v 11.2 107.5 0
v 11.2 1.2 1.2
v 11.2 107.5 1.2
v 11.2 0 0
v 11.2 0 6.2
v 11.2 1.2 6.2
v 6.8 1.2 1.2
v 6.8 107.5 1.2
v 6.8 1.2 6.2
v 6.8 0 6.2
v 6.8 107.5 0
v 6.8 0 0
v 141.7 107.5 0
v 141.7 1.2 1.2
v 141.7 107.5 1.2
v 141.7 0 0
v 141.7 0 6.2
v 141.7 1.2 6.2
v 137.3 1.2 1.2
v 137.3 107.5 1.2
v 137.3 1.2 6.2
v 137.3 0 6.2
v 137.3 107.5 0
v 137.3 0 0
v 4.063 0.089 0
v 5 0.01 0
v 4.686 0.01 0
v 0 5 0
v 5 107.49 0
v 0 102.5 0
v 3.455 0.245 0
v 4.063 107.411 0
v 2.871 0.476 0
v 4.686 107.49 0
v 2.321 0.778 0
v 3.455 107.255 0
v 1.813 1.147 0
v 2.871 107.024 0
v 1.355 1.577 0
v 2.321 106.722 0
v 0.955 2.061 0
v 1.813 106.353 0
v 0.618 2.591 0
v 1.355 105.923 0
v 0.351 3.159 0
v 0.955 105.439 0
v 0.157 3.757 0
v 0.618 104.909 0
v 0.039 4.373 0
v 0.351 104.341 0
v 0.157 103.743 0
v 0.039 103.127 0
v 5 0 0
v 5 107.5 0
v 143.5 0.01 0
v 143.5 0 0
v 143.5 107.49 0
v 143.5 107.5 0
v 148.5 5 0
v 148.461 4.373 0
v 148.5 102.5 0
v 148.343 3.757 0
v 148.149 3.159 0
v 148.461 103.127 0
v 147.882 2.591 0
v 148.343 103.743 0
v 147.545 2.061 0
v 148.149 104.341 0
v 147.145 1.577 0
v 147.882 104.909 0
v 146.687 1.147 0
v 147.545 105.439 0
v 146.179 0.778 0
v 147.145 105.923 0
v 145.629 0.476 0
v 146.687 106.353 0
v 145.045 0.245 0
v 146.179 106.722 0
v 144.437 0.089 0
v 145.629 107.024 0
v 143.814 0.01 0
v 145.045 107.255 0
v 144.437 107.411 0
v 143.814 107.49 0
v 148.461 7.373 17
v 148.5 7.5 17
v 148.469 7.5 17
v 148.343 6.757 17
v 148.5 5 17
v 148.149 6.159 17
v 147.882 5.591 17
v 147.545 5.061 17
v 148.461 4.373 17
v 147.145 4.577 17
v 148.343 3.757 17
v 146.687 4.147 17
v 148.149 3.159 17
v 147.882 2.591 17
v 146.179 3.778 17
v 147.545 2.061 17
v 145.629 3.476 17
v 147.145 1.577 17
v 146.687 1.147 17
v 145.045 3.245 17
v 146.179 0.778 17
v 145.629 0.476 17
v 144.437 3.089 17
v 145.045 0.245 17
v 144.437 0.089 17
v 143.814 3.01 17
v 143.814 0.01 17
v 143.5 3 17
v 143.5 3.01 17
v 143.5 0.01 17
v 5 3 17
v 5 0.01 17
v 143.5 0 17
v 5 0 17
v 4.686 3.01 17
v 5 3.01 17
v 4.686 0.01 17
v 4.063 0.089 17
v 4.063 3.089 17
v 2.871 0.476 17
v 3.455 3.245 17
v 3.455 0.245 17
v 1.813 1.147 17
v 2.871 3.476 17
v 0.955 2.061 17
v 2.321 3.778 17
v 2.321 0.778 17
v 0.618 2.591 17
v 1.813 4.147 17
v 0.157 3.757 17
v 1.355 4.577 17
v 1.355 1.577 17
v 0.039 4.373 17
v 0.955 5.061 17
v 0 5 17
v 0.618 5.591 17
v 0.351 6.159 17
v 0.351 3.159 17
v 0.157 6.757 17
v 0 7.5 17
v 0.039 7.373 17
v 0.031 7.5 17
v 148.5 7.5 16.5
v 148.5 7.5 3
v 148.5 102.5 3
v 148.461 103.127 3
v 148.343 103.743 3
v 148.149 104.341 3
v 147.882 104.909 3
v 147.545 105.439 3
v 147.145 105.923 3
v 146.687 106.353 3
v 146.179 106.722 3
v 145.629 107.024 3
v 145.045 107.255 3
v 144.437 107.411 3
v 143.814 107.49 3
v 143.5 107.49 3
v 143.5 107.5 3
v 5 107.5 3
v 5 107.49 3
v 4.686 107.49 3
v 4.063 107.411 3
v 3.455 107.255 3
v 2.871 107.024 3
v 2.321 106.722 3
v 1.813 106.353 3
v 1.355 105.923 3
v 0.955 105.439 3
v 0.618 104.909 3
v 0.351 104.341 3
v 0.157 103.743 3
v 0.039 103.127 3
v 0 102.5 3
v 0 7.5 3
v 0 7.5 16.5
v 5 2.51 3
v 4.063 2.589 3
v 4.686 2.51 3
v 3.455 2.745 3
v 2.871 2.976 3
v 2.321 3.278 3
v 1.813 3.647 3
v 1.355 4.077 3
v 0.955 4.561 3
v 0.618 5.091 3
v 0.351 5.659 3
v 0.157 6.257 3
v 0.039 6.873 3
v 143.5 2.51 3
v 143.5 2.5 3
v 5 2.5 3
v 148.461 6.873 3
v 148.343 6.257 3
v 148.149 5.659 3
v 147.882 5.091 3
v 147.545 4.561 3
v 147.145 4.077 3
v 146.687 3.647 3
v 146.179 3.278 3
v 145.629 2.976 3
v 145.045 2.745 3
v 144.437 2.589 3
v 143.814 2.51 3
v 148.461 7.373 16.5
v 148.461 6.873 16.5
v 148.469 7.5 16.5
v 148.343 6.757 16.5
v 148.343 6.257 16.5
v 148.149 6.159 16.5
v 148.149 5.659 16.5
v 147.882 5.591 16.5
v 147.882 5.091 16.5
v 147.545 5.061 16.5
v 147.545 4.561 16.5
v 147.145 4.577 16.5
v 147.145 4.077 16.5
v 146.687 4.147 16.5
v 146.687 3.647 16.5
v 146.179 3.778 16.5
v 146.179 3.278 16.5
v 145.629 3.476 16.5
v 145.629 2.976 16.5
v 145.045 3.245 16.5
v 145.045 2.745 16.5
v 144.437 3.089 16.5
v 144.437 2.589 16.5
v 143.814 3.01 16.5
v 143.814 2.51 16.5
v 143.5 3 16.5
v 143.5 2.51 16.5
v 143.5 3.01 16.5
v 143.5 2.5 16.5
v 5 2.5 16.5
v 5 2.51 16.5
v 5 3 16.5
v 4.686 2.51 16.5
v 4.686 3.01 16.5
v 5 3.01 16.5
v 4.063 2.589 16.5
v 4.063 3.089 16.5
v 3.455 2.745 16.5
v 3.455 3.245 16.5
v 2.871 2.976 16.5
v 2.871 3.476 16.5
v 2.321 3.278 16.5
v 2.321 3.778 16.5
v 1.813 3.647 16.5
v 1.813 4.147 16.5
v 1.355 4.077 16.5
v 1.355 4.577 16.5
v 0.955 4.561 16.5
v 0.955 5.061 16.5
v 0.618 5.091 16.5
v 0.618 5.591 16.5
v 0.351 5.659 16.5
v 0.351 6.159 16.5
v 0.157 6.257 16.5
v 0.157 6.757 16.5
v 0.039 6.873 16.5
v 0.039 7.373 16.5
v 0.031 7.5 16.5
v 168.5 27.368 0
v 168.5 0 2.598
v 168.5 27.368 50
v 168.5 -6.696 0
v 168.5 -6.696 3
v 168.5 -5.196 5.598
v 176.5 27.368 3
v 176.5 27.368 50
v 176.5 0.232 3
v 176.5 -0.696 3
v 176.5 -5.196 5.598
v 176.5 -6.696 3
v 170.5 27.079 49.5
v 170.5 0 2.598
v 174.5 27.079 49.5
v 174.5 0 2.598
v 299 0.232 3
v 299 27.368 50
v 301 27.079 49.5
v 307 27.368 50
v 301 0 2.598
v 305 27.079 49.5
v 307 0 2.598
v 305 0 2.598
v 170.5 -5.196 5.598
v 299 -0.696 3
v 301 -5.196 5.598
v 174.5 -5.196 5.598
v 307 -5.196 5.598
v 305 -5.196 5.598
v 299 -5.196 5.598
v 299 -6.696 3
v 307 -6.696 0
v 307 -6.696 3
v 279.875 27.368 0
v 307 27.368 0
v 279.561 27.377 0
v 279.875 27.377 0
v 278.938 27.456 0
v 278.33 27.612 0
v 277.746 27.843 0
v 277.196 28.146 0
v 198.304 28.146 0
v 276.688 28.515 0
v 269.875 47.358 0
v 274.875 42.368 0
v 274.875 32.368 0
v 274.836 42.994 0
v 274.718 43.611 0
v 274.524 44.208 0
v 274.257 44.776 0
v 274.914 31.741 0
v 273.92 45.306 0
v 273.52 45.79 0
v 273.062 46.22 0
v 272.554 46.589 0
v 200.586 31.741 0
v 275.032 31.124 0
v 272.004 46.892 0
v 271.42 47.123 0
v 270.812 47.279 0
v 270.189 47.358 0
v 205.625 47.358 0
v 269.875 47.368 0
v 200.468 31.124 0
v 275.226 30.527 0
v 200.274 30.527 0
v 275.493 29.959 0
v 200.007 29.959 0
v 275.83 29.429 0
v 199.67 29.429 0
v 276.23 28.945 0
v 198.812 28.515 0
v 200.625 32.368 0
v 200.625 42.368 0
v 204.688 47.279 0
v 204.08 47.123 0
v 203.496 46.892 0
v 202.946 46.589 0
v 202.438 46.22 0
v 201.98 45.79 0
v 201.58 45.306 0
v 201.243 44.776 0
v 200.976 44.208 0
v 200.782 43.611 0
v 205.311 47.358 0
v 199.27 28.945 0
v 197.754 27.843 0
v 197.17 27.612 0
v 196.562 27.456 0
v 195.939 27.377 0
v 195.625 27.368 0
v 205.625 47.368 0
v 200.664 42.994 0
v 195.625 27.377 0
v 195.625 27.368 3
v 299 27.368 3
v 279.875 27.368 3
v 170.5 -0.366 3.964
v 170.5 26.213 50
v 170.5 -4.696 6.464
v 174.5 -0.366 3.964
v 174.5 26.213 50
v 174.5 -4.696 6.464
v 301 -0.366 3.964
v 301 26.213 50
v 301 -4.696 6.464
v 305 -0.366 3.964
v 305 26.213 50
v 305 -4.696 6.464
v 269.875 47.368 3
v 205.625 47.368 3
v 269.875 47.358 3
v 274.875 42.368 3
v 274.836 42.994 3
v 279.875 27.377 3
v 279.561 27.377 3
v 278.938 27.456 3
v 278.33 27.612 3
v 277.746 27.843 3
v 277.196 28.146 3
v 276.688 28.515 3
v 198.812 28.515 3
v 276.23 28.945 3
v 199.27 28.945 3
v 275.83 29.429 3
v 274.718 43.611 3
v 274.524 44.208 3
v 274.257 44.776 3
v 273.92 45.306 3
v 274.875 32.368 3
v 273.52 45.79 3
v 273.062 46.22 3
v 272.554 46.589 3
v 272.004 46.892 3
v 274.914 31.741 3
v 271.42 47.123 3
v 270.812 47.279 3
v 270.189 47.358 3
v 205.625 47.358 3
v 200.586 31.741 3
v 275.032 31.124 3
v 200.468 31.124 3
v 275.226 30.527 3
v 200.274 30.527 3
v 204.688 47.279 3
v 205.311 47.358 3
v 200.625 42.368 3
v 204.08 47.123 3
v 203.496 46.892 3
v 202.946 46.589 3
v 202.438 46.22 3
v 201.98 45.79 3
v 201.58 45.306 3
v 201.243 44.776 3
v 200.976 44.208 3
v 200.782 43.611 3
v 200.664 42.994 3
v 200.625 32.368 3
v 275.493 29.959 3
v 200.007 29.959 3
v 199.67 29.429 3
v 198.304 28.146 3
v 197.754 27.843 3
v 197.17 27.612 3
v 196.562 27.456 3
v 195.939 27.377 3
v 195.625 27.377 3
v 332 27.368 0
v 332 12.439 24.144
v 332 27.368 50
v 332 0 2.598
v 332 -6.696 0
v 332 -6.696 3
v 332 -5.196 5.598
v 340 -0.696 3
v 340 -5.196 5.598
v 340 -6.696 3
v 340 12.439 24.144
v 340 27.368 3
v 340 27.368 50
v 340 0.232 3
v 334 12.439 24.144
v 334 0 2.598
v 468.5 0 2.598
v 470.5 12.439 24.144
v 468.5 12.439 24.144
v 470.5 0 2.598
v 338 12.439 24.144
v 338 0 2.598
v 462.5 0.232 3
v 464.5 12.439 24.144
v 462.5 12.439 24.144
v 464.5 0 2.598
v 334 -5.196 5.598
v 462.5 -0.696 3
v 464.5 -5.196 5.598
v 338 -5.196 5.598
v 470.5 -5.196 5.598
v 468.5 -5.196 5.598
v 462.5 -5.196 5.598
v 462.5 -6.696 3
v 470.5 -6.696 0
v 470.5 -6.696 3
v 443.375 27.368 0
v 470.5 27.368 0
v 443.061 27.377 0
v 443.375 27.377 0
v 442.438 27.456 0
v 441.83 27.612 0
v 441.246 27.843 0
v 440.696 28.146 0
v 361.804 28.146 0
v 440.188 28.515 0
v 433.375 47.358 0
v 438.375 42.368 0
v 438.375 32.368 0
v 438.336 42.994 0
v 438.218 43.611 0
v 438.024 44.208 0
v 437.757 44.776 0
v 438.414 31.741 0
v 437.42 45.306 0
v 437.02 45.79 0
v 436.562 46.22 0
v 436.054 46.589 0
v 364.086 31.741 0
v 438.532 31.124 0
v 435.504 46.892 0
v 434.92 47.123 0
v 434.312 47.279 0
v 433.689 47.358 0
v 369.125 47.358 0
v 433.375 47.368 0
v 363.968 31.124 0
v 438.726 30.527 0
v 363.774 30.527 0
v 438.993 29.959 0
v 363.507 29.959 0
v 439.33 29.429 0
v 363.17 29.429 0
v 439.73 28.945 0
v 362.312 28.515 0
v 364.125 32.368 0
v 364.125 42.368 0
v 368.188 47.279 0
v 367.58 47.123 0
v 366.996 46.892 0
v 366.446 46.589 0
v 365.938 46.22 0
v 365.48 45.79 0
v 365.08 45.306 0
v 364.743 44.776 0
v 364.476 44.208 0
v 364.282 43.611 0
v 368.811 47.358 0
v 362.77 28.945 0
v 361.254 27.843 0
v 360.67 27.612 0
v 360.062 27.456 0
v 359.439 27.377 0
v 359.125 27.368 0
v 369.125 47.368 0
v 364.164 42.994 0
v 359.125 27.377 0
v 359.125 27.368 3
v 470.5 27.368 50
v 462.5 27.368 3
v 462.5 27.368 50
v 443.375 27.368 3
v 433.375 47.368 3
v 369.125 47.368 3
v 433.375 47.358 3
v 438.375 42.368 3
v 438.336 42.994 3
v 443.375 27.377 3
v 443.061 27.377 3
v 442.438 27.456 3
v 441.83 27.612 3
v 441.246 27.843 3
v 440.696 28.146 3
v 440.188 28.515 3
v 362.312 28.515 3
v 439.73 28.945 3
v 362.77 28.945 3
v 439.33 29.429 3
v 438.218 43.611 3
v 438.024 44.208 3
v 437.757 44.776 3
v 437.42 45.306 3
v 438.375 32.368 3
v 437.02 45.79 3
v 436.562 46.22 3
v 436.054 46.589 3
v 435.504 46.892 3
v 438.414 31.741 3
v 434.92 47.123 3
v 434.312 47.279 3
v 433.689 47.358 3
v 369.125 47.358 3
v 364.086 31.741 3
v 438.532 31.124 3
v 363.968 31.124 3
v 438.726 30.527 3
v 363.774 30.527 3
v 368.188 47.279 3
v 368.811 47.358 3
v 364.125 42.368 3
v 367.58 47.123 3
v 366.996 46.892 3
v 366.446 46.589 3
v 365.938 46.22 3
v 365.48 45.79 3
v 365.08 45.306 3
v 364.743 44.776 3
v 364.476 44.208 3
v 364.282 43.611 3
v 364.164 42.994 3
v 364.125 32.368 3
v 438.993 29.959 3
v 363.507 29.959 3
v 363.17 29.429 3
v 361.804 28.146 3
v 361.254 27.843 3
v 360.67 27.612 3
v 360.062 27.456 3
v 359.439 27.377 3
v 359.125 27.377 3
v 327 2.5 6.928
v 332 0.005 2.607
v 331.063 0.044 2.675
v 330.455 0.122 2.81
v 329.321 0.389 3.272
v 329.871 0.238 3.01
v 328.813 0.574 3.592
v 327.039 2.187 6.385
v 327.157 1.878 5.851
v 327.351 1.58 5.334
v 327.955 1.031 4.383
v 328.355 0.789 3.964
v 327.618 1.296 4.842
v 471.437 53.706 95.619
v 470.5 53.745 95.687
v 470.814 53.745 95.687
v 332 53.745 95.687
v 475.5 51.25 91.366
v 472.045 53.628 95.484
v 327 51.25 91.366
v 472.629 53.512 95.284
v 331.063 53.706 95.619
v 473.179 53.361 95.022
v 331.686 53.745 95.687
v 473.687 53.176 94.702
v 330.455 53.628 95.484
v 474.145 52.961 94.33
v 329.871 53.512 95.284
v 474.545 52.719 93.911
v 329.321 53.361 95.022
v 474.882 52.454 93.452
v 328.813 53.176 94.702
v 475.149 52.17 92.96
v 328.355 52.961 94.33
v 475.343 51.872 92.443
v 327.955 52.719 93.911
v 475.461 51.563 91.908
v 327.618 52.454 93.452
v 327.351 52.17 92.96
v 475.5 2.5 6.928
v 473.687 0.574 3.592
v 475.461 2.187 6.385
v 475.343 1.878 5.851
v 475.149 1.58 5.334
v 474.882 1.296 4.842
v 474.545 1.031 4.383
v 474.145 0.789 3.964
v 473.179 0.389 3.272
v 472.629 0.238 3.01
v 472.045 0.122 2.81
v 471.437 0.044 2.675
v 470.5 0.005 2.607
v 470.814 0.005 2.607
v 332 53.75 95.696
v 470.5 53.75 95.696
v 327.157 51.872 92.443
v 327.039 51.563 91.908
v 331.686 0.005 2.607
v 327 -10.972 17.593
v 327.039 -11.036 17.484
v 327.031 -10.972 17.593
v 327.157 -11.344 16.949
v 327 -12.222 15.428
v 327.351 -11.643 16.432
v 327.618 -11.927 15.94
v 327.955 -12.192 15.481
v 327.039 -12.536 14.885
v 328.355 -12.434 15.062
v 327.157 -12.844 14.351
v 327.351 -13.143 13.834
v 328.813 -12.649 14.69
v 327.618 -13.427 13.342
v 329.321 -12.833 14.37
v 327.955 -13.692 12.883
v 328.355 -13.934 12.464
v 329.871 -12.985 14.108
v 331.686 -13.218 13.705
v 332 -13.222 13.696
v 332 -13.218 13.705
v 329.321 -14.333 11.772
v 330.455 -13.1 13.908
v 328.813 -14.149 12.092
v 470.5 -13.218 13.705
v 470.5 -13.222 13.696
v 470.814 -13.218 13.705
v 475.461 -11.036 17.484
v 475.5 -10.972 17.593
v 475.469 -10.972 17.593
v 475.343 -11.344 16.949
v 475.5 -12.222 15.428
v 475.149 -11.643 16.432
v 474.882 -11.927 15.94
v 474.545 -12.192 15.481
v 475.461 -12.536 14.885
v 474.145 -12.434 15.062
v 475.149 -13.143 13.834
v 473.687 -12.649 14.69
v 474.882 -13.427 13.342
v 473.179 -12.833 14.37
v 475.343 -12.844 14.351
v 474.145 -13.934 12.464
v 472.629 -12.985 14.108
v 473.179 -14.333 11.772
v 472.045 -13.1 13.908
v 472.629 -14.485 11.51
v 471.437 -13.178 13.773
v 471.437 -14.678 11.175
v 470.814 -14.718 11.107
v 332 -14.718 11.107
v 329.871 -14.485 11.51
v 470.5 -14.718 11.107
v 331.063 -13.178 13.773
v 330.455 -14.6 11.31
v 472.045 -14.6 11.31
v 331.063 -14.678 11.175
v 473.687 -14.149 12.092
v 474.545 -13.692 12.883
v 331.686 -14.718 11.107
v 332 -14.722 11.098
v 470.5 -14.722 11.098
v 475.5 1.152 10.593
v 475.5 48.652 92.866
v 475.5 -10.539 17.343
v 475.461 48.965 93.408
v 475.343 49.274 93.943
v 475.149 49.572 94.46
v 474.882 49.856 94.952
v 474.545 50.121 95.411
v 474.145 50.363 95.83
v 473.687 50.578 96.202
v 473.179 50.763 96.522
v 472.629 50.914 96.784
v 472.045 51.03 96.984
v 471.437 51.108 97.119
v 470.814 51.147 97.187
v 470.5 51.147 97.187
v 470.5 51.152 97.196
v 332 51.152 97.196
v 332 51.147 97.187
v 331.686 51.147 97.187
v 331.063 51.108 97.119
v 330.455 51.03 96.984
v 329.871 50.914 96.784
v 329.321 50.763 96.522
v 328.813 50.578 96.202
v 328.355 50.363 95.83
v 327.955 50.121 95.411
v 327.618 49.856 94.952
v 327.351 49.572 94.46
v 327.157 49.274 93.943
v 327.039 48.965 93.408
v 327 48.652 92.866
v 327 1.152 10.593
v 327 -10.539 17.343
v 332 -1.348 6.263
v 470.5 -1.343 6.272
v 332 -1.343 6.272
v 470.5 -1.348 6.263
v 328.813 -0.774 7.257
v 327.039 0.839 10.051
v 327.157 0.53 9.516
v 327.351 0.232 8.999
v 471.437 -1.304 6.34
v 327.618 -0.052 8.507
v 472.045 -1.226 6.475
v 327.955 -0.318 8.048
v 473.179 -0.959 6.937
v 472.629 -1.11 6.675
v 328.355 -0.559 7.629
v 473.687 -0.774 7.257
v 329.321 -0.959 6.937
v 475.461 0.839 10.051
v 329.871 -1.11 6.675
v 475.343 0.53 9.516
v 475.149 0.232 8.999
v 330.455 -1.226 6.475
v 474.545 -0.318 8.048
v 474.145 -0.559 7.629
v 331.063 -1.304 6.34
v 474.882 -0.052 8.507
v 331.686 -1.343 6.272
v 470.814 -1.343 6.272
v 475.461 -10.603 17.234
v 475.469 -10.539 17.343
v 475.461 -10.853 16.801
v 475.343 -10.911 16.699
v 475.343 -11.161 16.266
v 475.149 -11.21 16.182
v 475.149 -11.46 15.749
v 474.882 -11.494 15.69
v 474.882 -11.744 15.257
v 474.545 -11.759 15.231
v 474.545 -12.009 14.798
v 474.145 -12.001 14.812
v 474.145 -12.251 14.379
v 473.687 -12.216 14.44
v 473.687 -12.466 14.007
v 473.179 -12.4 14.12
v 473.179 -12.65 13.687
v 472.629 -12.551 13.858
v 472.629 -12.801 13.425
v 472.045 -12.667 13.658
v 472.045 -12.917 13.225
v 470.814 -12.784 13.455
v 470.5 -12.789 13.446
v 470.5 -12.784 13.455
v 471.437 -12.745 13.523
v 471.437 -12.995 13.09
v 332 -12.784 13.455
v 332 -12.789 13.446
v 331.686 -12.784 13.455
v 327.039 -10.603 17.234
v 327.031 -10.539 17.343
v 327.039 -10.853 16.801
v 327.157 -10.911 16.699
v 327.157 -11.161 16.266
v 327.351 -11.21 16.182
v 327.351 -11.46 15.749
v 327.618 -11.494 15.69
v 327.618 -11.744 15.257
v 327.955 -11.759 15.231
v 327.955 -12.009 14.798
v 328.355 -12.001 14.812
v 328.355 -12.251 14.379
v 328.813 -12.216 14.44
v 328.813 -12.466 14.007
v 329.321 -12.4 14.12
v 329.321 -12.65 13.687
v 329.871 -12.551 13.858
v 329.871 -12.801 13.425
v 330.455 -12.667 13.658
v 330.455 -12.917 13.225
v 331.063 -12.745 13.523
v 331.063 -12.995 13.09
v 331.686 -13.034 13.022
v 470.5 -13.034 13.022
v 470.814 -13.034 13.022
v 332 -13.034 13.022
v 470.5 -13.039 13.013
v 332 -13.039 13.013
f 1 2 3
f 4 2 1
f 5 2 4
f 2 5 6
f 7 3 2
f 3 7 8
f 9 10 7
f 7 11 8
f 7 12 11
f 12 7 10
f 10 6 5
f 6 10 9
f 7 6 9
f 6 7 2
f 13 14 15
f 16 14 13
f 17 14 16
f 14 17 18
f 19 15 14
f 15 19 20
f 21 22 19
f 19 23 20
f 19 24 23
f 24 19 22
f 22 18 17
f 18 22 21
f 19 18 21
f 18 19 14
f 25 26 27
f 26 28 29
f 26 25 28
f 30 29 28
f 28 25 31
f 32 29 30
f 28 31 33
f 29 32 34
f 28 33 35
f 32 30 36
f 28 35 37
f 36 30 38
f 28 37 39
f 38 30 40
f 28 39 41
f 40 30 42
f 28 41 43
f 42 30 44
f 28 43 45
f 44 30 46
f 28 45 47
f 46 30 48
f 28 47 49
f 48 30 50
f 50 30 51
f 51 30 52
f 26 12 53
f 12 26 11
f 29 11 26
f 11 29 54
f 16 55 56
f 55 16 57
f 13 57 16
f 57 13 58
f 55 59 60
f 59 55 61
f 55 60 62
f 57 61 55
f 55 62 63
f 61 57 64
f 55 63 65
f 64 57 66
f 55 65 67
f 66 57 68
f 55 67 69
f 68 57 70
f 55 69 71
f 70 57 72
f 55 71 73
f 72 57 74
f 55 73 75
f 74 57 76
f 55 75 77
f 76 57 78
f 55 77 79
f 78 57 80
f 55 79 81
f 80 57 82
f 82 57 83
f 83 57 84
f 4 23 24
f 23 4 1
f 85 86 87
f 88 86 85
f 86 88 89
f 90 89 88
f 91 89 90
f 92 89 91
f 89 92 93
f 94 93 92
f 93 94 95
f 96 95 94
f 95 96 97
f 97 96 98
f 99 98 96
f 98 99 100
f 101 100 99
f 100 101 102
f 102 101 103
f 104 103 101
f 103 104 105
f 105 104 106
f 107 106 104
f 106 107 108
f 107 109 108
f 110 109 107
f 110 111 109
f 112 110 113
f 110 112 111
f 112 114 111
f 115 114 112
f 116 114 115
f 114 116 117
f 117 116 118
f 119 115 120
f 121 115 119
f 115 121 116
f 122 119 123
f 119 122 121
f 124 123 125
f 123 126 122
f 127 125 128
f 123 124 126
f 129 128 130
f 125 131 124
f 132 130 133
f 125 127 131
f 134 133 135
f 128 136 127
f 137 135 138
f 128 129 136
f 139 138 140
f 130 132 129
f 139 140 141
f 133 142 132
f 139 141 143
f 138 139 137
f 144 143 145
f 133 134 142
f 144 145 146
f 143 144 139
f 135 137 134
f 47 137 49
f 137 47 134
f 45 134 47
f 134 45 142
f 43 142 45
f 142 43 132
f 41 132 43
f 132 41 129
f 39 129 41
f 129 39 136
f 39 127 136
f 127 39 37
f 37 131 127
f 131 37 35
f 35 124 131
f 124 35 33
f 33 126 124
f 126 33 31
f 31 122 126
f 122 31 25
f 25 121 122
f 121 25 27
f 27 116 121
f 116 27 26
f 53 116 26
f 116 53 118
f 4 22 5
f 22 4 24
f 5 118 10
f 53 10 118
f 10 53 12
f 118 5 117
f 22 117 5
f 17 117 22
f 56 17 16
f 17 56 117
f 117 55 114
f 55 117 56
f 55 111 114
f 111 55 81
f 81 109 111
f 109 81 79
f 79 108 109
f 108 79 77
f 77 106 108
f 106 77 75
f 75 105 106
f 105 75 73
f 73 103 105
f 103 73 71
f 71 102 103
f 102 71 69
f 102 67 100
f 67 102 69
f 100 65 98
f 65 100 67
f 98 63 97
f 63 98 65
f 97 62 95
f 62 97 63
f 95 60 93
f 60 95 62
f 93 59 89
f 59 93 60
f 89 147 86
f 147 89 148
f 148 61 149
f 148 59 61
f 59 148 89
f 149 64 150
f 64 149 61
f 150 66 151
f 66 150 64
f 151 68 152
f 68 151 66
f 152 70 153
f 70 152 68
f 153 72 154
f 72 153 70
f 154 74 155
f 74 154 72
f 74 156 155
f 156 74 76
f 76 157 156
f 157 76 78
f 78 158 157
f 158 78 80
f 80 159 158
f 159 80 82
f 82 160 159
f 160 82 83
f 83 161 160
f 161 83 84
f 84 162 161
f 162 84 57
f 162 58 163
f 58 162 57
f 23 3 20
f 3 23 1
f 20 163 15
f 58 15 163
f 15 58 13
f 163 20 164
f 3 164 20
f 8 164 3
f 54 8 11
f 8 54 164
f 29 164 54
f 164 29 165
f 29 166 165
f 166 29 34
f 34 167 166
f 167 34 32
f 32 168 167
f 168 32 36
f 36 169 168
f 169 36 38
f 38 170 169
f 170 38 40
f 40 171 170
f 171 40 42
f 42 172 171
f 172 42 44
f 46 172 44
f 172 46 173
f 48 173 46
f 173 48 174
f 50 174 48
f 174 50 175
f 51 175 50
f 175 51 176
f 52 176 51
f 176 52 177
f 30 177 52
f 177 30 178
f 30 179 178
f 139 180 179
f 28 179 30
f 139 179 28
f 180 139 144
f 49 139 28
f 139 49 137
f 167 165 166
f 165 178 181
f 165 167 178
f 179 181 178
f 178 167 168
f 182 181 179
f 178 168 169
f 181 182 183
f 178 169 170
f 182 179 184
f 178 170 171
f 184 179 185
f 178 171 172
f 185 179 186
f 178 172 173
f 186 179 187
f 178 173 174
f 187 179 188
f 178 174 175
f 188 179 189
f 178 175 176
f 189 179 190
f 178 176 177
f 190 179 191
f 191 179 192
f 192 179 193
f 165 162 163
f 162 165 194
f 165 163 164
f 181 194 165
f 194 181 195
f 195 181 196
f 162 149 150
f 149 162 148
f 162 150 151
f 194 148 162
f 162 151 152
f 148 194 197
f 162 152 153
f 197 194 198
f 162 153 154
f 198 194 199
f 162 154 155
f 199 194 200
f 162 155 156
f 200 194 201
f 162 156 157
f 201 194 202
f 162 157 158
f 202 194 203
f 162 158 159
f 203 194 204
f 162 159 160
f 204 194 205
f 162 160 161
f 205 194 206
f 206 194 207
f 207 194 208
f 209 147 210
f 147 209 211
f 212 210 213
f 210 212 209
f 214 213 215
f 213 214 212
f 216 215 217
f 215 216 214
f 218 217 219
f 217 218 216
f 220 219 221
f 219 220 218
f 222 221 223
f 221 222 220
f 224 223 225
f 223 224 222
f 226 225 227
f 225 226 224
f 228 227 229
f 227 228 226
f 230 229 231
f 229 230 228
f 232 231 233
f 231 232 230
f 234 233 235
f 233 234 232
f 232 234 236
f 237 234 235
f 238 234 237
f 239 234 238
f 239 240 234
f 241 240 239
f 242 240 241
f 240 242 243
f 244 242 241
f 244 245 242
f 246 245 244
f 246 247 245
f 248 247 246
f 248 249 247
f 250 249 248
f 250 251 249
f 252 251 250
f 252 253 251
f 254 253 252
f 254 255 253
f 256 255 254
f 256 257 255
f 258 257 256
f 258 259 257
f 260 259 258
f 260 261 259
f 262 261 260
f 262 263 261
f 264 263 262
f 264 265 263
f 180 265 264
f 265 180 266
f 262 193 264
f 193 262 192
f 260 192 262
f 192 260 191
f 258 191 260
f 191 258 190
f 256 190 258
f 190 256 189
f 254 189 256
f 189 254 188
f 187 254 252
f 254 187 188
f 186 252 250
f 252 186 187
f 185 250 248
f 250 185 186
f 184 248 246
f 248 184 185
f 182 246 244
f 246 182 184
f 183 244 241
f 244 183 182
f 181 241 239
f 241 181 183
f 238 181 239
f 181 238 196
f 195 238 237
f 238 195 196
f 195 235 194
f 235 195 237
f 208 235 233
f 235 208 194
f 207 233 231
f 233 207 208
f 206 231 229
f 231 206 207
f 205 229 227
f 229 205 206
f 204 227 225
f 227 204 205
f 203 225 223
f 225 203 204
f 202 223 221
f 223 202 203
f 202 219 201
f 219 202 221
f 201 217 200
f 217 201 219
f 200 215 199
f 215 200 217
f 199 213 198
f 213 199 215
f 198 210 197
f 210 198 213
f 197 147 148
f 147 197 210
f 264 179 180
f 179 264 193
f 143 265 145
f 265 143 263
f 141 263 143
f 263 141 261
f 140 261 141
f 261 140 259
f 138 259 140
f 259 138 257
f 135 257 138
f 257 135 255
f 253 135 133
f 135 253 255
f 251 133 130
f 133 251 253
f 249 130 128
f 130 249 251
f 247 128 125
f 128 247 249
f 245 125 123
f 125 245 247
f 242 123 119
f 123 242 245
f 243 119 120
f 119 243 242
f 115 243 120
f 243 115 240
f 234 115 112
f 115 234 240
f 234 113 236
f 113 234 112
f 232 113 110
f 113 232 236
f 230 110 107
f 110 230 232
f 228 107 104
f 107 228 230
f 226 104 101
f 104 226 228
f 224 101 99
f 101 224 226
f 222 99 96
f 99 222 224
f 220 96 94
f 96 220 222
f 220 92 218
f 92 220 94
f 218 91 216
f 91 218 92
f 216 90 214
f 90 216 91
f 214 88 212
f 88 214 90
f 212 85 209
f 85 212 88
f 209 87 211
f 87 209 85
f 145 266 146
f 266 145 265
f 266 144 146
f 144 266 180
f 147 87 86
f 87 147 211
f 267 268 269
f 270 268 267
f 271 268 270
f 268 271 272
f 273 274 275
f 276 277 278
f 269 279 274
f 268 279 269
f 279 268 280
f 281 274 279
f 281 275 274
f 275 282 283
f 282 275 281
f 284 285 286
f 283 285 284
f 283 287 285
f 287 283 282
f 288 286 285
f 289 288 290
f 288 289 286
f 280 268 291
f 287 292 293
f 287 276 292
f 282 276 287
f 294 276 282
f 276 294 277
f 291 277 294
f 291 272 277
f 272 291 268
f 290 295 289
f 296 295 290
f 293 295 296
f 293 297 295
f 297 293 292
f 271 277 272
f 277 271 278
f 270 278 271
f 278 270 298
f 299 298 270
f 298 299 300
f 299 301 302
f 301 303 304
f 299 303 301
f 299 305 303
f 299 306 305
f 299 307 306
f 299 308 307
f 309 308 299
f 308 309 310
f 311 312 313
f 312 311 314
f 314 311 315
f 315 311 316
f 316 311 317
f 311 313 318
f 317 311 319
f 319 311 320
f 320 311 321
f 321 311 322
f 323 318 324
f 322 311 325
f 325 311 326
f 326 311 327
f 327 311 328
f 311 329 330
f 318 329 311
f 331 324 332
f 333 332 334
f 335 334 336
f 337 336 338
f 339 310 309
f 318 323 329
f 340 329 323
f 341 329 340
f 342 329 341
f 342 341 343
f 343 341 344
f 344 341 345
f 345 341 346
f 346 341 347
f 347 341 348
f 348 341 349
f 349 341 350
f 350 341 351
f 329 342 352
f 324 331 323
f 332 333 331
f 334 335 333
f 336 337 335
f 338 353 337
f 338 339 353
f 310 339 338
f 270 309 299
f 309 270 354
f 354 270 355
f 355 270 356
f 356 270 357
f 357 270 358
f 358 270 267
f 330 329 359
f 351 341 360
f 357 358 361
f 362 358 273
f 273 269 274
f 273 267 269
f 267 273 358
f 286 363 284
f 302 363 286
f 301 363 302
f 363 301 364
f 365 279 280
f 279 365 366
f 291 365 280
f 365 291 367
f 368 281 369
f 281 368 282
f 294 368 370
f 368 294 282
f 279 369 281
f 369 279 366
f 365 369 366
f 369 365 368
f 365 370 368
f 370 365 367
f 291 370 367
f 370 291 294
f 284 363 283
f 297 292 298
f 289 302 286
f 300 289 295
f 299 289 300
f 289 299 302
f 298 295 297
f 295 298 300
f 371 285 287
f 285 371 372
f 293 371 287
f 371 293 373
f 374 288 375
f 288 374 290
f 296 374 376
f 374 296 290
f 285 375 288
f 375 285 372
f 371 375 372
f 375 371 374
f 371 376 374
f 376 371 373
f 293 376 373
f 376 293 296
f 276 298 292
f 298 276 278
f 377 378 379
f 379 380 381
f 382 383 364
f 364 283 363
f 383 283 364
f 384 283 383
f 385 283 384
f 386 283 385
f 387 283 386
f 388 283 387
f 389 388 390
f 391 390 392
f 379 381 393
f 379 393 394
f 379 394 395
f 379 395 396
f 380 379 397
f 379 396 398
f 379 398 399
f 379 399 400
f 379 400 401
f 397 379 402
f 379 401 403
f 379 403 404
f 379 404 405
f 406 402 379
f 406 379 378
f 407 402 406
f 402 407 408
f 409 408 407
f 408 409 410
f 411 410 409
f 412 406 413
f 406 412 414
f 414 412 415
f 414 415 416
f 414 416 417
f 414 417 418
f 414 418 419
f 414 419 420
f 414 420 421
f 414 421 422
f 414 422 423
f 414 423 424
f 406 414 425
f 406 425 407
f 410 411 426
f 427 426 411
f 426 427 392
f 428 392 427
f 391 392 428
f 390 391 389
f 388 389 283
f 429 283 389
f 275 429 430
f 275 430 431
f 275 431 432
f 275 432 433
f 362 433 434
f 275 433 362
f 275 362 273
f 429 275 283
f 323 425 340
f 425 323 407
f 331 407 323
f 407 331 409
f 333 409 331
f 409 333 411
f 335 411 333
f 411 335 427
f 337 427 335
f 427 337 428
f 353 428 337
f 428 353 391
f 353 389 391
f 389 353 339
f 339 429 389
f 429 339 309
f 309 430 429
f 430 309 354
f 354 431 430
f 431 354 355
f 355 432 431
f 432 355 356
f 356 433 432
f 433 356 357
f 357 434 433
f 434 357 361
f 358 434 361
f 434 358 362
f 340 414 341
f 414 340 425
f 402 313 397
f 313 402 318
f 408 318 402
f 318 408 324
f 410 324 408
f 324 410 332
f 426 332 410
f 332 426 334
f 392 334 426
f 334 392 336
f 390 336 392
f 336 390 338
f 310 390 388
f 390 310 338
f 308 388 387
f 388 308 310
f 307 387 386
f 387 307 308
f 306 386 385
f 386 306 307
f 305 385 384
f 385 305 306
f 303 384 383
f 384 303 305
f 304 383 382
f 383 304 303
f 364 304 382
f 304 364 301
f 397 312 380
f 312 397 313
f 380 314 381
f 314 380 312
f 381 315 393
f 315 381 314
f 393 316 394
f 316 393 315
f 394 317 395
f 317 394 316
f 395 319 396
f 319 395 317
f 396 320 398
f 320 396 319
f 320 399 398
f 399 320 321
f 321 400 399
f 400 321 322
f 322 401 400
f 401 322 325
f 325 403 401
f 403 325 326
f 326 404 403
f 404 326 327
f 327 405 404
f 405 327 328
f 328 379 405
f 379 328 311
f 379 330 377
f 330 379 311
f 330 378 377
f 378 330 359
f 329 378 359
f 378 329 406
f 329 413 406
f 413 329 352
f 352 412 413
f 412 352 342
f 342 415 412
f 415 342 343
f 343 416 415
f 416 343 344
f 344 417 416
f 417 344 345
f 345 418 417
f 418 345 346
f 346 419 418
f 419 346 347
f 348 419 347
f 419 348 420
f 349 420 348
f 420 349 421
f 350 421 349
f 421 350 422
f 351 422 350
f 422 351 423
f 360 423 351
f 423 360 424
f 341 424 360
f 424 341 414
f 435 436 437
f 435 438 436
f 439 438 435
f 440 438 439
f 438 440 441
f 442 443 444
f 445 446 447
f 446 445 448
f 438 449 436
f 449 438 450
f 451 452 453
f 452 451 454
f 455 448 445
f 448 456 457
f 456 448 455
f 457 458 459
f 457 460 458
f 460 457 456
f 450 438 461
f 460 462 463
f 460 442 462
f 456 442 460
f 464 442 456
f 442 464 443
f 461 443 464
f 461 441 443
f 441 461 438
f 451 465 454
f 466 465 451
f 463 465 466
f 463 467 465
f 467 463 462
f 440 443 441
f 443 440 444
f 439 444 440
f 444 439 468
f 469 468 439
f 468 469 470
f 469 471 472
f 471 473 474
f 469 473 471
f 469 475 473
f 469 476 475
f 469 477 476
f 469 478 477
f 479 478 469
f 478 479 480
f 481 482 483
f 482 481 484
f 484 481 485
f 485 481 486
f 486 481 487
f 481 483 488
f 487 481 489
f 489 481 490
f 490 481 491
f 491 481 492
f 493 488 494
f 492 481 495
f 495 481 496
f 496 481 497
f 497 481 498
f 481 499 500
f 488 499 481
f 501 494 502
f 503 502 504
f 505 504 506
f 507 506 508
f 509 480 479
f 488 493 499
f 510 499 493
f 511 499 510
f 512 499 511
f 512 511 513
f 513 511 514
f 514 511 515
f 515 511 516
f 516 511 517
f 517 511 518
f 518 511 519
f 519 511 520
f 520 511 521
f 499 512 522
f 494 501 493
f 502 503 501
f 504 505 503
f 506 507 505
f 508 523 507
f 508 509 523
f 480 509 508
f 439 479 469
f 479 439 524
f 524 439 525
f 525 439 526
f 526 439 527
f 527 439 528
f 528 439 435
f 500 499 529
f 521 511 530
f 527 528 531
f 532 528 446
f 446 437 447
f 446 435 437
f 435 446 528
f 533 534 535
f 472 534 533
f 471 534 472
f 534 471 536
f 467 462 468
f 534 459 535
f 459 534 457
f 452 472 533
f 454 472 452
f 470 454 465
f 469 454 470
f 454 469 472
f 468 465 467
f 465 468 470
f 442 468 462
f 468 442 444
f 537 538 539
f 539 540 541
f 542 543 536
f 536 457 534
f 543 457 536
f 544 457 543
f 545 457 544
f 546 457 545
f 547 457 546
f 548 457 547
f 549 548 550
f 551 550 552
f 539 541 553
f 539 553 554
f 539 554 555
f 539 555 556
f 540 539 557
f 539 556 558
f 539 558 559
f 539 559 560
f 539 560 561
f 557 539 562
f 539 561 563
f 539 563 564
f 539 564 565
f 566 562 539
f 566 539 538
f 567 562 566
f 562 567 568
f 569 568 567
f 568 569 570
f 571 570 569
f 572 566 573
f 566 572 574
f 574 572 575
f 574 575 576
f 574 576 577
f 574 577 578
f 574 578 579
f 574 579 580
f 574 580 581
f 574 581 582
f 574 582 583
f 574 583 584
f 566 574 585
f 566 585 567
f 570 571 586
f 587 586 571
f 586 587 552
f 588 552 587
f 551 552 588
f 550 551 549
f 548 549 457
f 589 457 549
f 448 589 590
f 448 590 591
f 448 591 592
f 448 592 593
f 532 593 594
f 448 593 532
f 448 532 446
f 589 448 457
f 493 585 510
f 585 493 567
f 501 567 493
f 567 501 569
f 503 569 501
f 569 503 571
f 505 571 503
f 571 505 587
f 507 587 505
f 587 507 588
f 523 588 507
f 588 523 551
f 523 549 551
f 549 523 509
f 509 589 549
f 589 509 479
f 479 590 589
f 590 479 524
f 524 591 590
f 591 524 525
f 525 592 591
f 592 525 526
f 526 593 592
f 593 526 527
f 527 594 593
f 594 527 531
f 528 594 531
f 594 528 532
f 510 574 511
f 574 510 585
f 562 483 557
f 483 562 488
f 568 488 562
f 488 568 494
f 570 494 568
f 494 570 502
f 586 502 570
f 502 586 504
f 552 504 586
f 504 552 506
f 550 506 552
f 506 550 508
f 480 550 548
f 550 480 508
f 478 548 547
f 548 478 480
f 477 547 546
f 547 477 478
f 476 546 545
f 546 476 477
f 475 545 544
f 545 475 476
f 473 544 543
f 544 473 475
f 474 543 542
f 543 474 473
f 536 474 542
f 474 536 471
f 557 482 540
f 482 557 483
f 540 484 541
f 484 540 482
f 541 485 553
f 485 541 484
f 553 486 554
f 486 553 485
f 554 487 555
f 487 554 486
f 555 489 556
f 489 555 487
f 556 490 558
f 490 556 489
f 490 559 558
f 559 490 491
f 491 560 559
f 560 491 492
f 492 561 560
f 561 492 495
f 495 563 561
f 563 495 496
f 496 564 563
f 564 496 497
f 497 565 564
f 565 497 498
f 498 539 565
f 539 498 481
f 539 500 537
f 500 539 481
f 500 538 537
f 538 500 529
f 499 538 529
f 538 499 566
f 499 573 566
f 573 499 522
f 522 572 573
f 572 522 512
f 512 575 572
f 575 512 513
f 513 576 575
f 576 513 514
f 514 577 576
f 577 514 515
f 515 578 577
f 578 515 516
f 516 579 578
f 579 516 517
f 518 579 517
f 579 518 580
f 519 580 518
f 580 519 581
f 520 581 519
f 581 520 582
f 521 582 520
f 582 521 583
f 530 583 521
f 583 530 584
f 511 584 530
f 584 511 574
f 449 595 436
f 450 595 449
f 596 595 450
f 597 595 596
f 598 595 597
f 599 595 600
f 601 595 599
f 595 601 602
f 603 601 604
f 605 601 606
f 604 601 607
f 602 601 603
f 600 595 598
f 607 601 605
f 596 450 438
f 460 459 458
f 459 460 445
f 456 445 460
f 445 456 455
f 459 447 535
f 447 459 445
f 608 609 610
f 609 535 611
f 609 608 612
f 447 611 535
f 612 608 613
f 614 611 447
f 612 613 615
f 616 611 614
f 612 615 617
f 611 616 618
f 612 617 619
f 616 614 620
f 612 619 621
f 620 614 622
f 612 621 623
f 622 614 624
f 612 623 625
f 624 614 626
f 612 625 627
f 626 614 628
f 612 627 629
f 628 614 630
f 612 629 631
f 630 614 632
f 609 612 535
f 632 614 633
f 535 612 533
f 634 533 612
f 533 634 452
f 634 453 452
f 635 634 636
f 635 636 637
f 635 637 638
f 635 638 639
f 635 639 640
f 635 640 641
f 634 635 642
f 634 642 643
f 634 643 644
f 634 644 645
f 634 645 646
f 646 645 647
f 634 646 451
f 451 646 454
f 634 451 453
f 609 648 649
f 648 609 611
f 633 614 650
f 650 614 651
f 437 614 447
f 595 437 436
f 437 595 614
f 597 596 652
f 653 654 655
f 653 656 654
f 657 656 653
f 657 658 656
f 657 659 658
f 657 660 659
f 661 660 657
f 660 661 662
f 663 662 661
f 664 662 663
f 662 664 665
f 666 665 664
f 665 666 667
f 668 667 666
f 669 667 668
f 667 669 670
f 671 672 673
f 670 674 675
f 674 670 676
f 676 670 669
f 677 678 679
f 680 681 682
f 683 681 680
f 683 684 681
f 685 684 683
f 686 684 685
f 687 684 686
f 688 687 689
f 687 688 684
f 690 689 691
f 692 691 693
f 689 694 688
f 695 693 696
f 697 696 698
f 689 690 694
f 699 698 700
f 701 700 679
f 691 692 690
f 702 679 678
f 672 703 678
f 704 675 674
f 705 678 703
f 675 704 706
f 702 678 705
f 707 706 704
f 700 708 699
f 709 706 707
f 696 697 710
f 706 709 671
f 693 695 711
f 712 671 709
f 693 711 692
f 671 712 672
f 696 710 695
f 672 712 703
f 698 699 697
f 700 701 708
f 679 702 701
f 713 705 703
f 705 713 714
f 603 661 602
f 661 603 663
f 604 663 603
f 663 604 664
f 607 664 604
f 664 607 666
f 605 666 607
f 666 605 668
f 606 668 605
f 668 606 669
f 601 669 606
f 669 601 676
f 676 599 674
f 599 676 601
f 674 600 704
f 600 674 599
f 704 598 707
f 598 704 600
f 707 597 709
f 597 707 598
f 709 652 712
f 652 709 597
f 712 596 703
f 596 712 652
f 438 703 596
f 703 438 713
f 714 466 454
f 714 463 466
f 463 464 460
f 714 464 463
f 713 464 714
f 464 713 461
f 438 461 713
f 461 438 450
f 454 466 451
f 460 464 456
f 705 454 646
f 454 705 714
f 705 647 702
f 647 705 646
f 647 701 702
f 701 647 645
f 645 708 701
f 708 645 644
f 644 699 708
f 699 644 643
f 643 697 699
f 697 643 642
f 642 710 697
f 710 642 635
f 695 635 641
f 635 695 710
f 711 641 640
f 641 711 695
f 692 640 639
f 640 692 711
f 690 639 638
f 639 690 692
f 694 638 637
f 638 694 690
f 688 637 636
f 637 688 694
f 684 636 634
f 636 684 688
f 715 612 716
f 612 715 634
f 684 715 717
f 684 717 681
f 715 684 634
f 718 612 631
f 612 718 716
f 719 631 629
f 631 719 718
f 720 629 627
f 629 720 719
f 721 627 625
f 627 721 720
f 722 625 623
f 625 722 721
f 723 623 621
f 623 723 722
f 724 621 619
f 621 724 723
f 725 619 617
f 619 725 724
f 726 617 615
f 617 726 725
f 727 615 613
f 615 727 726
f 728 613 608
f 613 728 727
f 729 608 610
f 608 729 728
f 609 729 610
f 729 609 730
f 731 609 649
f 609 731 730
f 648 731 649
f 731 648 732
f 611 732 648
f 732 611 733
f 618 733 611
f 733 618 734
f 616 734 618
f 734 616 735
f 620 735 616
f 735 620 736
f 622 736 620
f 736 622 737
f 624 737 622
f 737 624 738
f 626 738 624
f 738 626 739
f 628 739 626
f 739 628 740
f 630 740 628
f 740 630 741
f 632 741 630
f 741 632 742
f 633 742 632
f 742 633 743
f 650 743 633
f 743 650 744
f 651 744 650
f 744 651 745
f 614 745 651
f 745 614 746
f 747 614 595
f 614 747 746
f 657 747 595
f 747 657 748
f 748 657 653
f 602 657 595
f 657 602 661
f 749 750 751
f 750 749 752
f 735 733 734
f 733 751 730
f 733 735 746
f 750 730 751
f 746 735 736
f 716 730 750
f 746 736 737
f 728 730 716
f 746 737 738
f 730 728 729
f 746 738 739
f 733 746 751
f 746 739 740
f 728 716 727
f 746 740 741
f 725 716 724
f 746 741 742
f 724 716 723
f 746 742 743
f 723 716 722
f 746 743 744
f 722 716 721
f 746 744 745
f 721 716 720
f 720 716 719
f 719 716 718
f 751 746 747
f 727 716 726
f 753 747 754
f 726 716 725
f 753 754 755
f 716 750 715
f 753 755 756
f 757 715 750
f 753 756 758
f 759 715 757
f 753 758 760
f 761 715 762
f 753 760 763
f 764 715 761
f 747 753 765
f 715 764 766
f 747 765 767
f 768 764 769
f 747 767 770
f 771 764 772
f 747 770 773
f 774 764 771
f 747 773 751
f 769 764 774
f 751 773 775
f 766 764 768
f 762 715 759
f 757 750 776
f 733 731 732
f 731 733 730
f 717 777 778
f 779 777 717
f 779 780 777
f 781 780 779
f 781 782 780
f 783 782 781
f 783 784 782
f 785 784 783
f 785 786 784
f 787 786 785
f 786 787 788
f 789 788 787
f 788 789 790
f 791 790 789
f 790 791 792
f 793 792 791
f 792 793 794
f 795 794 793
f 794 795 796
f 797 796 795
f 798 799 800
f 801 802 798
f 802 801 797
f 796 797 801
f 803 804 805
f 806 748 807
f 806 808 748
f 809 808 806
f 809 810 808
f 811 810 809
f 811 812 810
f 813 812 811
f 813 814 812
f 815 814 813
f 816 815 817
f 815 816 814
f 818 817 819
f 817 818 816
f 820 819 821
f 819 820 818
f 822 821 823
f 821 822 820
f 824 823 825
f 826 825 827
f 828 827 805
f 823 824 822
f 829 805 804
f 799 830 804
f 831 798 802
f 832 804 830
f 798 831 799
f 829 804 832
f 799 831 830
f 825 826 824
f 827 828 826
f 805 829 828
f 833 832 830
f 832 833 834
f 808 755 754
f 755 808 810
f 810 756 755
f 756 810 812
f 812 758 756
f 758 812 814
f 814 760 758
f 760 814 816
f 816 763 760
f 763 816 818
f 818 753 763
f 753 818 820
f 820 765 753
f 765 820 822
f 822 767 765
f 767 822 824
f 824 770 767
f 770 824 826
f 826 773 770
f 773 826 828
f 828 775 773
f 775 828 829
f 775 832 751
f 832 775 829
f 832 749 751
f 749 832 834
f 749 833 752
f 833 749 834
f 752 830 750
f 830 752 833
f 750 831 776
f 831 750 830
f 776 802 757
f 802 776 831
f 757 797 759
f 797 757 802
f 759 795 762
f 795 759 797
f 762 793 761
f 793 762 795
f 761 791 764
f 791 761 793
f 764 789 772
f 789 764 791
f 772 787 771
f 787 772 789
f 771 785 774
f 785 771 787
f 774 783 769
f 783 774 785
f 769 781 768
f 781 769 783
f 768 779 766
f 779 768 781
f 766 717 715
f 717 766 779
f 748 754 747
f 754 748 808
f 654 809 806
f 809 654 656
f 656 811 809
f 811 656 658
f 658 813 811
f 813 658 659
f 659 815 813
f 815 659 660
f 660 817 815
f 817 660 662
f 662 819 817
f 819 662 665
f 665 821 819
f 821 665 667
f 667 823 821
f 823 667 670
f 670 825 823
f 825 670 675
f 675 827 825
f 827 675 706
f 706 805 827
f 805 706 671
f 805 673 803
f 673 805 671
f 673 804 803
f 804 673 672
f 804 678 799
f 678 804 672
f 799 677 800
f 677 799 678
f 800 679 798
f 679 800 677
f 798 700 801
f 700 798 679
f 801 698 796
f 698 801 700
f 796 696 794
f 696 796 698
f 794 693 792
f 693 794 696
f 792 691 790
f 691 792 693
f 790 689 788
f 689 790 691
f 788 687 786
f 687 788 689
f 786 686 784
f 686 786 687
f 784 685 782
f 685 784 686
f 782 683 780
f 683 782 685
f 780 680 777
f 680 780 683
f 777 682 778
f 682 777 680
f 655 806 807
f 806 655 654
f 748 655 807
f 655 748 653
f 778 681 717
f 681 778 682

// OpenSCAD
// CHANGELOG (newest first; parsed by scripts/build-stl.mjs – format: "// <version> - <summary>", indented lines continue the entry)
// 1.0.0 - Initial versioned release: card holder plus a separate prop that tilts it to stand_angle, the prop cut off at prop_cut_height, plus an all-in-one variant with both fused together
//

/* [ Card dimmensions ] */
card_width = 148;
card_height = 105;
card_corner_radius = 5;
card_pack_thickness = 13;

/* [ Stand dimensions ] */
wall_thickness = 3;
// angle of the card plane from the table (90 = upright, smaller = more leaning back)
stand_angle = 60;
stand_clearance = 0.5;

thin_wall = 2;
lock = 0.5;

/* [ Prop ] */
// width of each of the two ribs
prop_rib_width = 8;
// distance of the ribs from the ends of the holder
prop_rib_inset = card_corner_radius;
// thickness of the base plate joining the ribs
prop_base_thickness = 3;
// height of the stop the bottom edge of the holder rests against (measured from the ramp)
prop_stop_height = 6;
// how far the stop reaches below the bottom edge of the holder (along the ramp)
prop_toe = 3;
// height of the prop above the table (0 = the prop reaches up to the top of the holder)
prop_cut_height = 50;
// how deep the prop sinks into the holder: tongues on the ramp (sides) and on the stop (bottom edge)
prop_tongue_depth = 1;
// width of the tongue on each rib (centered on the rib)
prop_tongue_width = 4;
// extra room of the grooves in the holder around the tongues
prop_fit_clearance = 0.2;
// length of the tail of the base plate behind the back of the prop
prop_base_tail = 20;
// radius of the rounded inner corners between the tail and the base plate (0 = sharp)
prop_tail_fillet = 5;

$fn=50;

/* [Hidden] */
// List of parts of this model – each item = one STL file. Every name needs a branch in render_part().
parts = ["holder", "prop", "all-in-one"];
// Which part to render: "all" = all side by side (preview), "assembly" = holder tilted on the prop,
// otherwise a name from `parts` (set by the build script via -D).
part = "all";
model_version = "1.0.0";

// ---- derived values (definition order matters) ----
holder_width = card_width + stand_clearance;
holder_length = card_height + thin_wall + stand_clearance;
// x positions of the two ribs of the prop and offset of the tongue inside a rib
prop_rib_xs = [prop_rib_inset, holder_width - prop_rib_inset - prop_rib_width];
tongue_dx = (prop_rib_width - prop_tongue_width) / 2;
assert(prop_tongue_width <= prop_rib_width, "prop_tongue_width must not exceed prop_rib_width");
// height of the bottom edge of the holder above the table (the stop of the prop reaches down to the table)
ramp_lift = prop_toe * sin(stand_angle);
// length of the ramp = length of the holder along the card plane that is left after the cut
ramp_length = prop_cut_height > 0
    ? min(holder_length, (prop_cut_height - ramp_lift) / sin(stand_angle))
    : holder_length;
assert(ramp_length > prop_stop_height, "prop_cut_height is too low for the stop of the prop");

// Point on the plane of the holder's back face, in the side view of the prop (y = away from the viewer,
// z = up). s = distance from the bottom edge of the holder along the card plane, n = distance in
// front of the plane (towards the viewer). The ramp surface of the prop is n = 0, the bottom edge of the
// holder (s = 0) is lifted so that the stop reaches exactly down to the table.
function ramp_pt(s, n) = [
    s * cos(stand_angle) - n * sin(stand_angle),
    prop_toe * sin(stand_angle) + s * sin(stand_angle) + n * cos(stand_angle)
];

module rounded_rectangle(x, y, radius) {
    union() {
        translate([radius, 0, 0]) square([x-2*radius, y]);
        translate([0, radius, 0]) square([x, y-2*radius]);
        corners = [[radius, radius], [radius, y-radius], [x-radius, radius], [x-radius, y-radius]];
        for (corner = corners) {
            translate([corner[0], corner[1], 0]) circle(radius);
        }
    }
}

module rounded_block(x, y, z, radius) {
    linear_extrude(height = z)
        rounded_rectangle(x, y, radius);
}

// The card holder in its print orientation (back face on Z=0).
// grooves = false leaves the back face solid (used by the all-in-one part, where the tongues of the
// prop grow into the holder).
module holder(grooves = true) {
    difference() {
        // Base block with clearance and lock
        rounded_block(
            holder_width,
            card_height + thin_wall + stand_clearance,
            card_pack_thickness + wall_thickness + stand_clearance + lock,
            card_corner_radius
        );
        // Subtract the inner block for - space for cards
        translate([0,  thin_wall + stand_clearance, wall_thickness]) rounded_block(
            holder_width,
            card_height + 100,
            card_pack_thickness + stand_clearance,
            card_corner_radius
        );
        // Subtract the inner block - create lock
        translate([0,  thin_wall + stand_clearance+lock, wall_thickness+lock]) rounded_block(
            holder_width,
            card_height + 100,
            card_pack_thickness + stand_clearance,
            card_corner_radius
        );
        // remove small edges
        translate([0,  thin_wall + stand_clearance + card_corner_radius, wall_thickness]) cube(holder_width, 10, 10);
        // L-shaped grooves for the tongues of the prop: along the back face and into the bottom edge
        if (grooves) for (x = prop_rib_xs) {
            translate([x + tongue_dx - prop_fit_clearance, -1, -1]) {
                // back face, open at the bottom edge, runs up the whole length
                cube([prop_tongue_width + 2 * prop_fit_clearance,
                      holder_length + 2,
                      1 + prop_tongue_depth + prop_fit_clearance]);
                // bottom edge (the stop of the prop)
                cube([prop_tongue_width + 2 * prop_fit_clearance,
                      1 + prop_tongue_depth + prop_fit_clearance,
                      1 + prop_stop_height + prop_fit_clearance]);
            }
        }
    }
}

// Side profile of one rib: a right triangle under the ramp (the holder lies on the hypotenuse) with a
// small stop at the bottom that keeps the holder from sliding down. Flat bottom on the table (z = 0).
module prop_profile() {
    top = ramp_pt(ramp_length, 0);
    toe = ramp_pt(-prop_toe, prop_stop_height);
    polygon(points = [
        top,
        [top[0], 0],
        [toe[0], 0],
        toe,
        ramp_pt(0, prop_stop_height),
        ramp_pt(0, 0)
    ]);
}

// Side profile of the L-shaped tongue that sinks into the holder: a strip on the ramp plus a strip on the
// face of the stop. It overlaps the rib by a hair so that the union is solid.
module prop_tongue_profile() {
    d = prop_tongue_depth;
    o = 0.05;
    // end of the strip on the ramp, so that its corner does not rise above the top of the prop
    s_end = ramp_length - d / tan(stand_angle);
    polygon(points = [
        ramp_pt(-o, -o),
        ramp_pt(s_end, -o),
        ramp_pt(s_end, d),
        ramp_pt(d, d),
        ramp_pt(d, prop_stop_height),
        ramp_pt(-o, prop_stop_height)
    ]);
}

// 2D fillet for a concave corner at the origin: the free area is x < 0, y > 0 (the tail side is x = 0,
// the back edge of the plate is y = 0). It overlaps the plate by a hair so that the union is solid.
module tail_fillet(f) {
    difference() {
        translate([-f, -0.01]) square([f, f + 0.01]);
        translate([-f, f]) circle(r = f);
    }
}

// The prop in its print orientation (standing on the table plane Z=0): two ribs joined by a base plate.
// Placed in the same X range as the holder, front of the stand towards -Y.
module prop() {
    toe_y = ramp_pt(-prop_toe, prop_stop_height)[0];
    back_y = ramp_pt(ramp_length, 0)[0];
    for (x = prop_rib_xs) {
        translate([x, 0, 0]) rotate([90, 0, 90]) linear_extrude(height = prop_rib_width) prop_profile();
        translate([x + tongue_dx, 0, 0]) rotate([90, 0, 90]) linear_extrude(height = prop_tongue_width) prop_tongue_profile();
    }
    // base plate, trimmed to the side profile so that it does not poke into the holder at its bottom edge
    union(){
        intersection() {
            translate([prop_rib_inset, toe_y, 0])
                cube([holder_width - 2 * prop_rib_inset, back_y - toe_y, prop_base_thickness]);
            translate([prop_rib_inset, 0, 0]) rotate([90, 0, 90])
                linear_extrude(height = holder_width - 2 * prop_rib_inset) prop_profile();
        }
        // tail behind the prop; centered in X on the holder (and so on the base plate). It starts
        // card_corner_radius inside the plate (so its rounded corners are hidden in it) and reaches
        // prop_base_tail behind the back of the prop.
        tail_w = holder_width / 2;
        tail_x0 = (holder_width - tail_w) / 2;
        translate([tail_x0, back_y - card_corner_radius, 0])
            rounded_block(tail_w, prop_base_tail + card_corner_radius, prop_base_thickness, card_corner_radius);
        // rounded inner corners between the tail and the back edge of the plate
        if (prop_tail_fillet > 0) {
            translate([tail_x0, back_y, 0]) linear_extrude(height = prop_base_thickness) tail_fillet(prop_tail_fillet);
            translate([tail_x0 + tail_w, back_y, 0]) mirror([1, 0, 0])
                linear_extrude(height = prop_base_thickness) tail_fillet(prop_tail_fillet);
        }
    }
}

// The holder tilted onto the ramp of the prop, as it stands on the table
module assembly() {
    prop();
    color("orange") translate([0, 0, ramp_lift]) rotate([stand_angle, 0, 0]) holder();
}

// Both parts fused into one solid in the assembled pose (the holder tilted on the prop, standing on the
// table plane Z=0). No grooves, no clearance: the tongues of the prop are part of the holder.
module all_in_one() {
    union() {
        prop();
        translate([0, 0, ramp_lift]) rotate([stand_angle, 0, 0]) holder(grooves = false);
    }
}

module render_part(p) {
    if (p == "holder") holder();
    else if (p == "prop") prop();
    else if (p == "all-in-one") all_in_one();
    else assert(false, str("Unknown part: ", p));
}

if (part == "all") {
    // Preview: all parts side by side, in the order of `parts`
    for (i = [0 : len(parts) - 1])
        translate([i * (holder_width + 15), 0, 0]) render_part(parts[i]);
} else if (part == "assembly") {
    assembly();
} else {
    render_part(part);
}
